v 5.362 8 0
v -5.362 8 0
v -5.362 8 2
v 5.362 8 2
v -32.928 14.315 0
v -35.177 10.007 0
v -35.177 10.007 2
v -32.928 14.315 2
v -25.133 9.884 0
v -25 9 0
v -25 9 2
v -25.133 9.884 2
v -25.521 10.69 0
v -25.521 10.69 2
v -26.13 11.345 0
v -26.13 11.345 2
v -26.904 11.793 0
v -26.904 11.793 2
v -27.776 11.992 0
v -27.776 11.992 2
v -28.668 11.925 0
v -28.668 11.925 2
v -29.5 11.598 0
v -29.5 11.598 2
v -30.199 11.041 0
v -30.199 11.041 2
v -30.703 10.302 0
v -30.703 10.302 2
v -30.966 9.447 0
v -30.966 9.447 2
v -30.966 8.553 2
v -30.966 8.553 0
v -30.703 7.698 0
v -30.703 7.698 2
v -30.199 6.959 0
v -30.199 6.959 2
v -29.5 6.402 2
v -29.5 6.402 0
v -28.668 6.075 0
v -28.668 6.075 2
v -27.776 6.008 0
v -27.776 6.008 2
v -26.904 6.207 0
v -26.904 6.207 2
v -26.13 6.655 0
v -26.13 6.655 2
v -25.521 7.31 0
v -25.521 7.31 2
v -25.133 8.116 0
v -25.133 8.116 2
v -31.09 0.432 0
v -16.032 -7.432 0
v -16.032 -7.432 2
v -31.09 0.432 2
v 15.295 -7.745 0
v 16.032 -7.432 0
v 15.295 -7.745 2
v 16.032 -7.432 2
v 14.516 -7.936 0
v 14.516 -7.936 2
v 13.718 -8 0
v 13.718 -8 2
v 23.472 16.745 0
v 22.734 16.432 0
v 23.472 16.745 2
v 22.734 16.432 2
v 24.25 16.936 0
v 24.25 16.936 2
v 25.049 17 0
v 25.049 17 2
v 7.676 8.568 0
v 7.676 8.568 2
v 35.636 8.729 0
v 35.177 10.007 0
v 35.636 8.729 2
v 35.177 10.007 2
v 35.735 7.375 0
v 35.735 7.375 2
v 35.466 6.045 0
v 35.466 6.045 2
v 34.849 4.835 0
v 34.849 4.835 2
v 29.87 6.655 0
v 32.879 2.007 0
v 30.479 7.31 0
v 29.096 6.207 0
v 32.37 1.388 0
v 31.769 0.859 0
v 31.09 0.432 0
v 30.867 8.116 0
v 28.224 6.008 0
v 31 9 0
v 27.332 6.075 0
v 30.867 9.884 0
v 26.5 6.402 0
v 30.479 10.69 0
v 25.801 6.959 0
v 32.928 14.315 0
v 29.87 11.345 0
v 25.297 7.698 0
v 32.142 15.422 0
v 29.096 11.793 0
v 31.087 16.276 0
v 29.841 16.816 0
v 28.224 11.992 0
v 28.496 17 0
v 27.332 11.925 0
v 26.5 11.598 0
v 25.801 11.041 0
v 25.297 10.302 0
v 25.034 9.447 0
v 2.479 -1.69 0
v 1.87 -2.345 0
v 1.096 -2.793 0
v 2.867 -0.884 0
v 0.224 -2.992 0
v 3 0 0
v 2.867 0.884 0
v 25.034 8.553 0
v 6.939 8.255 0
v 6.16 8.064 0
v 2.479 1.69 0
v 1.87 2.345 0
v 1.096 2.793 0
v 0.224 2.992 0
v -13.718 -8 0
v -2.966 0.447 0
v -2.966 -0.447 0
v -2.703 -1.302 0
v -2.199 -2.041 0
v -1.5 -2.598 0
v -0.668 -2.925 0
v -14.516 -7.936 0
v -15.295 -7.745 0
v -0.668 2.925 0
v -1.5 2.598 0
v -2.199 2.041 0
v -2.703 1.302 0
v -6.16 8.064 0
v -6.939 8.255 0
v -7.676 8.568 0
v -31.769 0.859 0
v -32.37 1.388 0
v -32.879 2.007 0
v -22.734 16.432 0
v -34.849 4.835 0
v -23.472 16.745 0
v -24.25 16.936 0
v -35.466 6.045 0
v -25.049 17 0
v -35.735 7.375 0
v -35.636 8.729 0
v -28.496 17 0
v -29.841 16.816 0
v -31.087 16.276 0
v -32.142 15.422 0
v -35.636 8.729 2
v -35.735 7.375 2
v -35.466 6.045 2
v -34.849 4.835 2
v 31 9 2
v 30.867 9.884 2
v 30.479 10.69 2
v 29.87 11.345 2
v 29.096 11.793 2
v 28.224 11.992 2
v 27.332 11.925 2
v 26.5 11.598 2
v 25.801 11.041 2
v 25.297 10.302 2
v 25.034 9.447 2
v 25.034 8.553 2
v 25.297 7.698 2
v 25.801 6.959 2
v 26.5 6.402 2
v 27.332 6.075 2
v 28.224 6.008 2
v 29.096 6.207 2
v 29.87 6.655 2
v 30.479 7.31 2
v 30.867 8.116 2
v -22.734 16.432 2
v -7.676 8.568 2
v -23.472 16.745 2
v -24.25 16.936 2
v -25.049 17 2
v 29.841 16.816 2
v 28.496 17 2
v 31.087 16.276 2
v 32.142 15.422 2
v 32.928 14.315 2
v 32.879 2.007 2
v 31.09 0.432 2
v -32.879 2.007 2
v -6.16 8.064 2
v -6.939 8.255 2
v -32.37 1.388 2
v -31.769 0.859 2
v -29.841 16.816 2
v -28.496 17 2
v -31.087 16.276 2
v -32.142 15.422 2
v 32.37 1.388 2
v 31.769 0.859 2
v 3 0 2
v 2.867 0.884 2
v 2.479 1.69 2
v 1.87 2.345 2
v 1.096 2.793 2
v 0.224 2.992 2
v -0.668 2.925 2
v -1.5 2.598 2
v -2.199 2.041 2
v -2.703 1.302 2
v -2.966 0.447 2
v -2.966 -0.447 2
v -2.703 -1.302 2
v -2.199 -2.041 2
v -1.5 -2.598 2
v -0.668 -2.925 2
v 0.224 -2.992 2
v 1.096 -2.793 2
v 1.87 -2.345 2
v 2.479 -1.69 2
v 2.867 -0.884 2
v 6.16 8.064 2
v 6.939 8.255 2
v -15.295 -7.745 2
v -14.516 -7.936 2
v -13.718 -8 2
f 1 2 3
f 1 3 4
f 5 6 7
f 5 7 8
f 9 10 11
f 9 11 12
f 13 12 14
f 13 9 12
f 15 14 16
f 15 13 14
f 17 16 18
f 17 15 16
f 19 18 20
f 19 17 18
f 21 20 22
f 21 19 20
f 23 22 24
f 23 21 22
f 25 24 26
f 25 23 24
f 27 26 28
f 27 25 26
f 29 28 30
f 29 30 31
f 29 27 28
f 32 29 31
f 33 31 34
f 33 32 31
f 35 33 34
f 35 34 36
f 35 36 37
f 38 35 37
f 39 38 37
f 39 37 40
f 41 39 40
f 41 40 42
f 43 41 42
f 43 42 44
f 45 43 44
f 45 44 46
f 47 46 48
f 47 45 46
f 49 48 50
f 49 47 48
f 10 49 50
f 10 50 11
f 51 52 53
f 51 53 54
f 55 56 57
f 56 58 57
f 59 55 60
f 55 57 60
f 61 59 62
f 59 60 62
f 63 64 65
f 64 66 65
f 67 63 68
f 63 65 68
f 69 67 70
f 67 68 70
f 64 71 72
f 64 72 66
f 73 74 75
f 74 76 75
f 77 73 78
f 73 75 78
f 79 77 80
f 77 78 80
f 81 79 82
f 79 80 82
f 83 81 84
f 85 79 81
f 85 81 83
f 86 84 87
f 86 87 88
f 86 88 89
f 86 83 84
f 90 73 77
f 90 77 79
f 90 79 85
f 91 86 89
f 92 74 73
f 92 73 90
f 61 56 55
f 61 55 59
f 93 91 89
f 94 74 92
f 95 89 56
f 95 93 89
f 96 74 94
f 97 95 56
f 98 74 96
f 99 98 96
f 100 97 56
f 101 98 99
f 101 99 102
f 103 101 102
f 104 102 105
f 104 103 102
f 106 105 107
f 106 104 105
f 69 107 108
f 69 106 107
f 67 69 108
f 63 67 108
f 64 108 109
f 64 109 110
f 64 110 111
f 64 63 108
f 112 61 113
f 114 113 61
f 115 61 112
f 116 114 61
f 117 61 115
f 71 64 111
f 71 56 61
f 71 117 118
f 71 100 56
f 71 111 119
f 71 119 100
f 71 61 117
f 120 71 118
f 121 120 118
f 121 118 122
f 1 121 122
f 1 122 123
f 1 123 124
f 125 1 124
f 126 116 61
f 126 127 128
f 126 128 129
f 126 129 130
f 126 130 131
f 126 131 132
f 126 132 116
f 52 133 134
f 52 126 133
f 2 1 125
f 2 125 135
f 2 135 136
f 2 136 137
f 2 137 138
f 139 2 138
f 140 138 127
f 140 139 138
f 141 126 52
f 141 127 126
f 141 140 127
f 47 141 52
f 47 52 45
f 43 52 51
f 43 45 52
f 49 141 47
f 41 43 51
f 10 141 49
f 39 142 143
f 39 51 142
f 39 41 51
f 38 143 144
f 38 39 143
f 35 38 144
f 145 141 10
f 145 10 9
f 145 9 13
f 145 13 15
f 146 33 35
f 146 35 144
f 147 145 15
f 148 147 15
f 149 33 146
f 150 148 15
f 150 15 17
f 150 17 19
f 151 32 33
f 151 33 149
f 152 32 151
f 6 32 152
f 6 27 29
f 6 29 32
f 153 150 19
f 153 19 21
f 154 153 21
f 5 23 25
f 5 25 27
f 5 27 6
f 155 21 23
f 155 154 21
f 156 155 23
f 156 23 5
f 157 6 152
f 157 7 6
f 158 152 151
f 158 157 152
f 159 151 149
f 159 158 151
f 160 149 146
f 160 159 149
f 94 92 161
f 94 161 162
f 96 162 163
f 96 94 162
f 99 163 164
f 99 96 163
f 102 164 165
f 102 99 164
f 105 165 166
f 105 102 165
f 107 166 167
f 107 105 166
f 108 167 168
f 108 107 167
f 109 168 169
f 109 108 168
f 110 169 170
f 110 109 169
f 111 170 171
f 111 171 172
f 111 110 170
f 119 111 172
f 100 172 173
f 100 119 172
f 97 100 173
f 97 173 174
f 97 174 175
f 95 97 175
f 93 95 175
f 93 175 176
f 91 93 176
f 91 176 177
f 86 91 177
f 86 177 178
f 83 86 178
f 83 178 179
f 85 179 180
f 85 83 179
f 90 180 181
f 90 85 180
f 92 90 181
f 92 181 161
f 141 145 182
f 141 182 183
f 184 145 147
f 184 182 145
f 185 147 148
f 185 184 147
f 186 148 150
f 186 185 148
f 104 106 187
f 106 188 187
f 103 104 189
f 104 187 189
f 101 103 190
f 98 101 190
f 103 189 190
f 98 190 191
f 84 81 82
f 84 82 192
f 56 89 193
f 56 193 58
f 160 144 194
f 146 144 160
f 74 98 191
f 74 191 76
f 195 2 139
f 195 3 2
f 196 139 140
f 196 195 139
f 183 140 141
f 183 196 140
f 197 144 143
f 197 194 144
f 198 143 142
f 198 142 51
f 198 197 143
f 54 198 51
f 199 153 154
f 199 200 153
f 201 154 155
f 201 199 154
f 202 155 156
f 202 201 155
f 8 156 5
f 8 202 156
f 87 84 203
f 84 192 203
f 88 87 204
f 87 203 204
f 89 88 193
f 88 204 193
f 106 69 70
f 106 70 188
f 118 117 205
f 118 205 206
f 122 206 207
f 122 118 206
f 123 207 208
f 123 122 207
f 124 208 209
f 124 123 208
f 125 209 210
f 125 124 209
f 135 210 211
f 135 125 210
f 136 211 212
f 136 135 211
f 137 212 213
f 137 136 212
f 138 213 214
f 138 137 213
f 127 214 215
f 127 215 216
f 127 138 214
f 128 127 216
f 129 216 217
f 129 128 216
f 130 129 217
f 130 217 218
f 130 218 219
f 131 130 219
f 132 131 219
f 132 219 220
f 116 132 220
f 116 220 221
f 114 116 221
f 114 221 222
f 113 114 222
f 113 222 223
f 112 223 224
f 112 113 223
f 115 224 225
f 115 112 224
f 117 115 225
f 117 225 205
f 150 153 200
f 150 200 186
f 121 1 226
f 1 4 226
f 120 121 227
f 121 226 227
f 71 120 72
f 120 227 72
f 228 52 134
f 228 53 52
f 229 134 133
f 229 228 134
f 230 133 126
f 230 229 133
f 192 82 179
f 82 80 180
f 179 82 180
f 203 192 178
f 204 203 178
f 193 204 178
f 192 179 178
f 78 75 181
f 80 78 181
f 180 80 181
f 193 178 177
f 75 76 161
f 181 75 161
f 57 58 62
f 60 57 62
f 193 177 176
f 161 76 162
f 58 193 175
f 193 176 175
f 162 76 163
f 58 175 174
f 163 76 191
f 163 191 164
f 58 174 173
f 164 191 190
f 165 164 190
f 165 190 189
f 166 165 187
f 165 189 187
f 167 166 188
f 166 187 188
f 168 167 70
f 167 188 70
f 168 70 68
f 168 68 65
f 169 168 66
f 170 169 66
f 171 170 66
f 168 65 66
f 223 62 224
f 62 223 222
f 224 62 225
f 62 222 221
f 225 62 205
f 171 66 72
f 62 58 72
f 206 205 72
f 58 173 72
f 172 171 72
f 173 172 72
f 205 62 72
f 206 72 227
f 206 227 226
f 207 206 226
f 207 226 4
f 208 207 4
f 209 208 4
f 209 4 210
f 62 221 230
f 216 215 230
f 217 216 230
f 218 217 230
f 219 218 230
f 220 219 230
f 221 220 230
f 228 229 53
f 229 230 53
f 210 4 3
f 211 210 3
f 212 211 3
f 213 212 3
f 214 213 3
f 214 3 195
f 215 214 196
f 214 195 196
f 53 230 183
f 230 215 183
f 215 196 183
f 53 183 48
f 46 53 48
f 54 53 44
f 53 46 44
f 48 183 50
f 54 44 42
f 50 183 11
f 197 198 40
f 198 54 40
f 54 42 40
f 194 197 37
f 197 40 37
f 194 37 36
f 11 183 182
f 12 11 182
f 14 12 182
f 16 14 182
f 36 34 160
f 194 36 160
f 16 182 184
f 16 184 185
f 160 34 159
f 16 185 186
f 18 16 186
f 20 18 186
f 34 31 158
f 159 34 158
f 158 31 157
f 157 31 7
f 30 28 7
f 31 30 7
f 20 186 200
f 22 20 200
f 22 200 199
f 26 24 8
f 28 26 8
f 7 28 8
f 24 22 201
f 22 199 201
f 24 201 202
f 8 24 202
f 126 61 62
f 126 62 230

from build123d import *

# Parameters (mm, degrees)
SZKIC1_R                    = 3
DODANIE_WYCI_GNI_CIE1_DEPTH = 2
ZAOKR_GLENIE2_R             = 5


with BuildPart() as part:
    # Szkic1 → Dodanie-wyciągnięcie1 (new body)
    with BuildSketch(Plane.XY):
        Polygon((-6.588738933, 8), (6.588738933, 8), (23.822043257, 17), (31.525212111, 17), (36.579652034, 7.321699847), (32.177956743, 1), (14.944652418, -8), (-14.944652418, -8), (-32.177956743, 1), (-36.579652034, 7.321699847), (-31.525212111, 17), (-23.822043257, 17), align=None)
        Circle(SZKIC1_R, mode=Mode.SUBTRACT)
        with Locations((28, 9)):
            Circle(SZKIC1_R, mode=Mode.SUBTRACT)
        with Locations((-28, 9)):
            Circle(SZKIC1_R, mode=Mode.SUBTRACT)
    extrude(amount=DODANIE_WYCI_GNI_CIE1_DEPTH)

    # Zaokrąglenie2
    zaokr_glenie2_edges = [part.edges().sort_by_distance(p)[0] for p in [
        (6.588738933, 8, 1),
        (23.822043257, 17, 1),
        (31.525212111, 17, 1),
        (36.579652034, 7.321699847, 1),
        (32.177956743, 1, 1),
        (14.944652418, -8, 1),
        (-14.944652418, -8, 1),
        (-32.177956743, 1, 1),
        (-36.579652034, 7.321699847, 1),
        (-31.525212111, 17, 1),
        (-23.822043257, 17, 1),
        (-6.588738933, 8, 1),
    ]]
    fillet(zaokr_glenie2_edges, radius=ZAOKR_GLENIE2_R)


solid = part.part
